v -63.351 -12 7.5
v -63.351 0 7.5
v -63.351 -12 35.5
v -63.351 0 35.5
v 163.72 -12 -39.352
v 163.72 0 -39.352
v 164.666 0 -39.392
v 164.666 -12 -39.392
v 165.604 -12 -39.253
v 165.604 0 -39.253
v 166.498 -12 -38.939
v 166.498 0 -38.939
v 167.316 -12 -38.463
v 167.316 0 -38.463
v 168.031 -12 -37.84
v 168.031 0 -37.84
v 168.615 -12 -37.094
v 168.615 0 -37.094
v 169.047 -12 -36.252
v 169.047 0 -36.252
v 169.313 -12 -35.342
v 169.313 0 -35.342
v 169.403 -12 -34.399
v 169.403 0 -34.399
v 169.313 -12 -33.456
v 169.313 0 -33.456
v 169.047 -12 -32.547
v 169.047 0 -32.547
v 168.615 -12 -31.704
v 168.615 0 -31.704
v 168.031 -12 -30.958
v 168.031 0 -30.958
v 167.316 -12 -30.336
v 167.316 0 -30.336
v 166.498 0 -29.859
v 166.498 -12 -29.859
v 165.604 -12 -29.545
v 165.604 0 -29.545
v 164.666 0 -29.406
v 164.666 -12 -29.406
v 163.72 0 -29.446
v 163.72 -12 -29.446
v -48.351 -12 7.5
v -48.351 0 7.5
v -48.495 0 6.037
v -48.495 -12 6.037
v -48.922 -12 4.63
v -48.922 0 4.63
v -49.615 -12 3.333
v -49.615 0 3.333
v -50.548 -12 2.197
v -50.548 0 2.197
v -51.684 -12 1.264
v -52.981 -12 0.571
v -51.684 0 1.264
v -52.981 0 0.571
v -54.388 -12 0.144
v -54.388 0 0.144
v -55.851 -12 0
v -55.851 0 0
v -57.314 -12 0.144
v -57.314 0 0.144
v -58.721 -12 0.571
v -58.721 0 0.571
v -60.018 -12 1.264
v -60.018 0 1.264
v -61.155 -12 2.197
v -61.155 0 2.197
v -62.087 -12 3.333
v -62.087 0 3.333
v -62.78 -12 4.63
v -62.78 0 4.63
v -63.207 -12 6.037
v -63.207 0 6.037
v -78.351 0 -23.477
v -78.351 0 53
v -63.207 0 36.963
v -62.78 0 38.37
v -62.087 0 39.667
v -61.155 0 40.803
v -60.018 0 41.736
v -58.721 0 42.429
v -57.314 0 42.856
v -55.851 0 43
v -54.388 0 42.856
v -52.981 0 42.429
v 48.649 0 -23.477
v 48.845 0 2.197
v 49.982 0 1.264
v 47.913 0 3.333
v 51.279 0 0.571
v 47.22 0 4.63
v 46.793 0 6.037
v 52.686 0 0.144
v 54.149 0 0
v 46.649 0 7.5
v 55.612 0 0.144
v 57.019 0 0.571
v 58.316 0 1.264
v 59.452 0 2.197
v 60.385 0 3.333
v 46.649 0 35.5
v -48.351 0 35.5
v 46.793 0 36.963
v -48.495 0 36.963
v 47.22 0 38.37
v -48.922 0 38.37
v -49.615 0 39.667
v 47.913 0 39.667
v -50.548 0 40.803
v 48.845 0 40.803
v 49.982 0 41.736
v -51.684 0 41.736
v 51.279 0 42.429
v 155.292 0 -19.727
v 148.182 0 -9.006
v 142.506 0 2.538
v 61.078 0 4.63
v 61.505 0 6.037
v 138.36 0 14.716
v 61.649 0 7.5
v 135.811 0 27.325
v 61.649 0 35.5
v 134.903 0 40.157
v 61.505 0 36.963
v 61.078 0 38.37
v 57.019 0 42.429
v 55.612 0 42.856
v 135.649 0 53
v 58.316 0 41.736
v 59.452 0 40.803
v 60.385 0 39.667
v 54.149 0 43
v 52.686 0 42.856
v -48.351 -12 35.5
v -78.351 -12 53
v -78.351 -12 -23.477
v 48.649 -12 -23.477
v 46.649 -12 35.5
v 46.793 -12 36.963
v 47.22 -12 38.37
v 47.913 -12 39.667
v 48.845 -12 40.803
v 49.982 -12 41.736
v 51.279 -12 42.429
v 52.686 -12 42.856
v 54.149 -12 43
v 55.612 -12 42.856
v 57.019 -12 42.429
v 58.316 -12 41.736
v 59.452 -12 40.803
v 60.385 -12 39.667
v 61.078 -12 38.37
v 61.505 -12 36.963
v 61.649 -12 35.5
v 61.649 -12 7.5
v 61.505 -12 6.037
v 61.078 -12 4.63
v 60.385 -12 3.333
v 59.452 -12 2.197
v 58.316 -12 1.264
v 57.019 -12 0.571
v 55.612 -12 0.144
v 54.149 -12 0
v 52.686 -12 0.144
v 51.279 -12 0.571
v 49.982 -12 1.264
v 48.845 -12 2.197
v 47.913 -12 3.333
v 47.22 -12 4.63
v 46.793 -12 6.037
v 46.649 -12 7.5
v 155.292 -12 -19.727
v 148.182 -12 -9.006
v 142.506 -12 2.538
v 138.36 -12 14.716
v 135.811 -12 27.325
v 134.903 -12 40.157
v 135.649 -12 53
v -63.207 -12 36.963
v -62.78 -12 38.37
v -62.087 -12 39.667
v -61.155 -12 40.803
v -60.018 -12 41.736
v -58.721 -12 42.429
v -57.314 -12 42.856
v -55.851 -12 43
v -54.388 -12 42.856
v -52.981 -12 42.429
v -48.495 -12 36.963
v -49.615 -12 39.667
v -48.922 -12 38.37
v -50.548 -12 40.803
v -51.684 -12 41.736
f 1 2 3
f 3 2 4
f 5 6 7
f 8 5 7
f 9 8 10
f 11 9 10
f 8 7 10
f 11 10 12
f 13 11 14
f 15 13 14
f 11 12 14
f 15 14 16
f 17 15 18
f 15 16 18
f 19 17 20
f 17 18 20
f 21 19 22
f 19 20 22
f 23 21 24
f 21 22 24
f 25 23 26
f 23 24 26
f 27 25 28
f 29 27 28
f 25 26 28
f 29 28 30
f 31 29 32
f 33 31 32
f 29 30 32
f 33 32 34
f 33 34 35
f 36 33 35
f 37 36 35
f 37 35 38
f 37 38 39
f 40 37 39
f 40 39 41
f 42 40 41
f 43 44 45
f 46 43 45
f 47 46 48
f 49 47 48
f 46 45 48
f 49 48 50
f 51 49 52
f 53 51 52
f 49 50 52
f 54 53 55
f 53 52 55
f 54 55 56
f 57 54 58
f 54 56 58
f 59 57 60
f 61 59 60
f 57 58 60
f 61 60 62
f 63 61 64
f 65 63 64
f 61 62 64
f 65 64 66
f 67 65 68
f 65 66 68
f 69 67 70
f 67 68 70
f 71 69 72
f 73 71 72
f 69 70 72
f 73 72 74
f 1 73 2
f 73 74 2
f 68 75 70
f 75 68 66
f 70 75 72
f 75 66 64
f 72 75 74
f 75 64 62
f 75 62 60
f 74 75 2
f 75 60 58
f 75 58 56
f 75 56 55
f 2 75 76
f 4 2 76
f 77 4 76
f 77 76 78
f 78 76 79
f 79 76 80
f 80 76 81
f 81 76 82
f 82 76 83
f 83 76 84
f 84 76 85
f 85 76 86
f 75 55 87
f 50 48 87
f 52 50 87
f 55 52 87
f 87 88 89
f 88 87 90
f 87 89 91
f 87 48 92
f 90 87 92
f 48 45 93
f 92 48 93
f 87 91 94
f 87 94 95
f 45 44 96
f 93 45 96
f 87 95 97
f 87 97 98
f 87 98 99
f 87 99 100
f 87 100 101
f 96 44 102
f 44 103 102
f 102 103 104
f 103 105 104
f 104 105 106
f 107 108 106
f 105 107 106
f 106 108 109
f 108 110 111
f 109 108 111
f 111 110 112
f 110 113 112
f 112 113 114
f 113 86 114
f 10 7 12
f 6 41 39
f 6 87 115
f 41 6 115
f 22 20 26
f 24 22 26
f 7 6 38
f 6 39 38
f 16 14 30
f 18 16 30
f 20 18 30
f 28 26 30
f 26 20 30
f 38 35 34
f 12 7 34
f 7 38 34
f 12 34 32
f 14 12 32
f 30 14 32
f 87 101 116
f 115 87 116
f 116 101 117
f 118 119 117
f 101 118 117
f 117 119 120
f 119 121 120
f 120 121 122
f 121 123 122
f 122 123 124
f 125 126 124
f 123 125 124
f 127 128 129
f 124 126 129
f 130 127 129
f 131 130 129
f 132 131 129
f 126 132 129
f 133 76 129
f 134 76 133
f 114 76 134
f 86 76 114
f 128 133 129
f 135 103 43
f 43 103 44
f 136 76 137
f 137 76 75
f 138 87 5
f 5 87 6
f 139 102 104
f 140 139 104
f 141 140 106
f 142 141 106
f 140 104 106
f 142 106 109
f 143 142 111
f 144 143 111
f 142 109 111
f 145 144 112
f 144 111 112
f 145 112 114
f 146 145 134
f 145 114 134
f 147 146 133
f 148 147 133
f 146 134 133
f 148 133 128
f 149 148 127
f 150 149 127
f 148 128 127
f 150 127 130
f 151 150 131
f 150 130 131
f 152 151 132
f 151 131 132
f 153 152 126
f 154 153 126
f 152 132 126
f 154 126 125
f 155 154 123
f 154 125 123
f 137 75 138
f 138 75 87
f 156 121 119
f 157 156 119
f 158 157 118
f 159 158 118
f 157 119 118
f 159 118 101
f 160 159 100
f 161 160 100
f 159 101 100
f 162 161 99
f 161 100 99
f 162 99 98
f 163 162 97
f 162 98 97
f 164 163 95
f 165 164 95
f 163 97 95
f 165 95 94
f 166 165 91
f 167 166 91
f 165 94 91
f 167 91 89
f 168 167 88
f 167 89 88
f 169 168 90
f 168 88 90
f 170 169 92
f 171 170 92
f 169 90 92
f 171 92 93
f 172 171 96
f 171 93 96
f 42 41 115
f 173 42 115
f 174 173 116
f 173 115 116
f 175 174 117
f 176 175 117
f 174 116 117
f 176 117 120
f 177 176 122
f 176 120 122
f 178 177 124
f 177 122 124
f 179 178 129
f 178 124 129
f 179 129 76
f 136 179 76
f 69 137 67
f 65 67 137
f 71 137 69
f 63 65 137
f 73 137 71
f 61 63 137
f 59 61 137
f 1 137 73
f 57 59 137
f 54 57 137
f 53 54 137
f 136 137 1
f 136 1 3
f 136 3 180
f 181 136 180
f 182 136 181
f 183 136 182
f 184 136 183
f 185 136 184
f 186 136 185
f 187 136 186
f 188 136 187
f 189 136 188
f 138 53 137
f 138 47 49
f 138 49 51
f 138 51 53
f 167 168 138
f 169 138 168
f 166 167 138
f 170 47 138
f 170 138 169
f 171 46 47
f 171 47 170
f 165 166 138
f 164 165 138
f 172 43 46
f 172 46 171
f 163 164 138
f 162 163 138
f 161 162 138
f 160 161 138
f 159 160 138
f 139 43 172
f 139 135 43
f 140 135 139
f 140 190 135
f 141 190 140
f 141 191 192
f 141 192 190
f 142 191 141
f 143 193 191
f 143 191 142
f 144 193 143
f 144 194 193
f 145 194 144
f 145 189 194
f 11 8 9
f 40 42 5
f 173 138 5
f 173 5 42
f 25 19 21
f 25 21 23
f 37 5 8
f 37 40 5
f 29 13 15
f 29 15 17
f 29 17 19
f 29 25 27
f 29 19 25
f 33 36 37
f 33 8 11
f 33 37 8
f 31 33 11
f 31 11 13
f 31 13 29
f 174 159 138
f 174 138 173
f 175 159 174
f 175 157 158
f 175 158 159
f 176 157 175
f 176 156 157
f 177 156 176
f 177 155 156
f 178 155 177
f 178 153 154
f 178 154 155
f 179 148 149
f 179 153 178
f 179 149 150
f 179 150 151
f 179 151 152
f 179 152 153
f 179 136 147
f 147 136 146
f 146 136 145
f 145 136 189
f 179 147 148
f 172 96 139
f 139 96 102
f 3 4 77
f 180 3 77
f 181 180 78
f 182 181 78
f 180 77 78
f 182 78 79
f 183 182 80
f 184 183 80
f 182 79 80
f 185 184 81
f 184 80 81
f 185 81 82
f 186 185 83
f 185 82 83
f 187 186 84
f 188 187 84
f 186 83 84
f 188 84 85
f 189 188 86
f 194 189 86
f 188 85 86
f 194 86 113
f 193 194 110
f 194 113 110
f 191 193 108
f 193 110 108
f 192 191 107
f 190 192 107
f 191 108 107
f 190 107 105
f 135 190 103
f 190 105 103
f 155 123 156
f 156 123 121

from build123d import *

# Parameters (mm, degrees)
F1_DEPTH = 12


# Not quite as in the source:
# - a feature names something its author has since deleted; it is built from what else it names


with BuildPart() as f1:
    # F0 (on Front) → F1 (new body)
    with BuildSketch(Plane.XZ):
        with BuildLine():
            Line((-78.3512531443, 52.5226152241), (-78.3512531443, -23.4773847759))
            Line((-78.3512531443, -23.4773847759), (48.6487468557, -23.4773847759))
            Line((48.6487468557, -23.4773847759), (163.7198627451, -39.3522962011))
            ThreePointArc((163.7198627451, -39.3522962011), (169.4031778605, -34.3992082296), (163.7198627451, -29.4461202581))
            ThreePointArc((163.7198627451, -29.4461202581), (140.2372169997, 8.5604113595), (135.6487468557, 53))
            Line((135.6487468557, 53), (129.9201593475, 53))
            Line((129.9201593475, 53), (-55.8512531443, 53))
            Line((-55.8512531443, 53), (-78.3512531443, 53))
            Line((-78.3512531443, 53), (-78.3512531443, 52.5226152241))
        make_face()
        with BuildLine():
            Line((-63.3512531443, 7.5), (-63.3512531443, 21.5))
            Line((-63.3512531443, 21.5), (-63.3512531443, 35.5))
            ThreePointArc((-63.3512531443, 35.5), (-55.8512531443, 43), (-48.3512531443, 35.5))
            Line((-48.3512531443, 35.5), (-48.3512531443, 7.5))
            ThreePointArc((-48.3512531443, 7.5), (-55.8512531443, 0), (-63.3512531443, 7.5))
        make_face(mode=Mode.SUBTRACT)
        with BuildLine():
            Line((46.6487468557, 7.5), (46.6487468557, 21.5))
            Line((46.6487468557, 21.5), (46.6487468557, 35.5))
            ThreePointArc((46.6487468557, 35.5), (54.1487468557, 43), (61.6487468557, 35.5))
            Line((61.6487468557, 35.5), (61.6487468557, 7.5))
            ThreePointArc((61.6487468557, 7.5), (54.1487468557, 0), (46.6487468557, 7.5))
        make_face(mode=Mode.SUBTRACT)
    extrude(amount=F1_DEPTH)


solid = f1.part
